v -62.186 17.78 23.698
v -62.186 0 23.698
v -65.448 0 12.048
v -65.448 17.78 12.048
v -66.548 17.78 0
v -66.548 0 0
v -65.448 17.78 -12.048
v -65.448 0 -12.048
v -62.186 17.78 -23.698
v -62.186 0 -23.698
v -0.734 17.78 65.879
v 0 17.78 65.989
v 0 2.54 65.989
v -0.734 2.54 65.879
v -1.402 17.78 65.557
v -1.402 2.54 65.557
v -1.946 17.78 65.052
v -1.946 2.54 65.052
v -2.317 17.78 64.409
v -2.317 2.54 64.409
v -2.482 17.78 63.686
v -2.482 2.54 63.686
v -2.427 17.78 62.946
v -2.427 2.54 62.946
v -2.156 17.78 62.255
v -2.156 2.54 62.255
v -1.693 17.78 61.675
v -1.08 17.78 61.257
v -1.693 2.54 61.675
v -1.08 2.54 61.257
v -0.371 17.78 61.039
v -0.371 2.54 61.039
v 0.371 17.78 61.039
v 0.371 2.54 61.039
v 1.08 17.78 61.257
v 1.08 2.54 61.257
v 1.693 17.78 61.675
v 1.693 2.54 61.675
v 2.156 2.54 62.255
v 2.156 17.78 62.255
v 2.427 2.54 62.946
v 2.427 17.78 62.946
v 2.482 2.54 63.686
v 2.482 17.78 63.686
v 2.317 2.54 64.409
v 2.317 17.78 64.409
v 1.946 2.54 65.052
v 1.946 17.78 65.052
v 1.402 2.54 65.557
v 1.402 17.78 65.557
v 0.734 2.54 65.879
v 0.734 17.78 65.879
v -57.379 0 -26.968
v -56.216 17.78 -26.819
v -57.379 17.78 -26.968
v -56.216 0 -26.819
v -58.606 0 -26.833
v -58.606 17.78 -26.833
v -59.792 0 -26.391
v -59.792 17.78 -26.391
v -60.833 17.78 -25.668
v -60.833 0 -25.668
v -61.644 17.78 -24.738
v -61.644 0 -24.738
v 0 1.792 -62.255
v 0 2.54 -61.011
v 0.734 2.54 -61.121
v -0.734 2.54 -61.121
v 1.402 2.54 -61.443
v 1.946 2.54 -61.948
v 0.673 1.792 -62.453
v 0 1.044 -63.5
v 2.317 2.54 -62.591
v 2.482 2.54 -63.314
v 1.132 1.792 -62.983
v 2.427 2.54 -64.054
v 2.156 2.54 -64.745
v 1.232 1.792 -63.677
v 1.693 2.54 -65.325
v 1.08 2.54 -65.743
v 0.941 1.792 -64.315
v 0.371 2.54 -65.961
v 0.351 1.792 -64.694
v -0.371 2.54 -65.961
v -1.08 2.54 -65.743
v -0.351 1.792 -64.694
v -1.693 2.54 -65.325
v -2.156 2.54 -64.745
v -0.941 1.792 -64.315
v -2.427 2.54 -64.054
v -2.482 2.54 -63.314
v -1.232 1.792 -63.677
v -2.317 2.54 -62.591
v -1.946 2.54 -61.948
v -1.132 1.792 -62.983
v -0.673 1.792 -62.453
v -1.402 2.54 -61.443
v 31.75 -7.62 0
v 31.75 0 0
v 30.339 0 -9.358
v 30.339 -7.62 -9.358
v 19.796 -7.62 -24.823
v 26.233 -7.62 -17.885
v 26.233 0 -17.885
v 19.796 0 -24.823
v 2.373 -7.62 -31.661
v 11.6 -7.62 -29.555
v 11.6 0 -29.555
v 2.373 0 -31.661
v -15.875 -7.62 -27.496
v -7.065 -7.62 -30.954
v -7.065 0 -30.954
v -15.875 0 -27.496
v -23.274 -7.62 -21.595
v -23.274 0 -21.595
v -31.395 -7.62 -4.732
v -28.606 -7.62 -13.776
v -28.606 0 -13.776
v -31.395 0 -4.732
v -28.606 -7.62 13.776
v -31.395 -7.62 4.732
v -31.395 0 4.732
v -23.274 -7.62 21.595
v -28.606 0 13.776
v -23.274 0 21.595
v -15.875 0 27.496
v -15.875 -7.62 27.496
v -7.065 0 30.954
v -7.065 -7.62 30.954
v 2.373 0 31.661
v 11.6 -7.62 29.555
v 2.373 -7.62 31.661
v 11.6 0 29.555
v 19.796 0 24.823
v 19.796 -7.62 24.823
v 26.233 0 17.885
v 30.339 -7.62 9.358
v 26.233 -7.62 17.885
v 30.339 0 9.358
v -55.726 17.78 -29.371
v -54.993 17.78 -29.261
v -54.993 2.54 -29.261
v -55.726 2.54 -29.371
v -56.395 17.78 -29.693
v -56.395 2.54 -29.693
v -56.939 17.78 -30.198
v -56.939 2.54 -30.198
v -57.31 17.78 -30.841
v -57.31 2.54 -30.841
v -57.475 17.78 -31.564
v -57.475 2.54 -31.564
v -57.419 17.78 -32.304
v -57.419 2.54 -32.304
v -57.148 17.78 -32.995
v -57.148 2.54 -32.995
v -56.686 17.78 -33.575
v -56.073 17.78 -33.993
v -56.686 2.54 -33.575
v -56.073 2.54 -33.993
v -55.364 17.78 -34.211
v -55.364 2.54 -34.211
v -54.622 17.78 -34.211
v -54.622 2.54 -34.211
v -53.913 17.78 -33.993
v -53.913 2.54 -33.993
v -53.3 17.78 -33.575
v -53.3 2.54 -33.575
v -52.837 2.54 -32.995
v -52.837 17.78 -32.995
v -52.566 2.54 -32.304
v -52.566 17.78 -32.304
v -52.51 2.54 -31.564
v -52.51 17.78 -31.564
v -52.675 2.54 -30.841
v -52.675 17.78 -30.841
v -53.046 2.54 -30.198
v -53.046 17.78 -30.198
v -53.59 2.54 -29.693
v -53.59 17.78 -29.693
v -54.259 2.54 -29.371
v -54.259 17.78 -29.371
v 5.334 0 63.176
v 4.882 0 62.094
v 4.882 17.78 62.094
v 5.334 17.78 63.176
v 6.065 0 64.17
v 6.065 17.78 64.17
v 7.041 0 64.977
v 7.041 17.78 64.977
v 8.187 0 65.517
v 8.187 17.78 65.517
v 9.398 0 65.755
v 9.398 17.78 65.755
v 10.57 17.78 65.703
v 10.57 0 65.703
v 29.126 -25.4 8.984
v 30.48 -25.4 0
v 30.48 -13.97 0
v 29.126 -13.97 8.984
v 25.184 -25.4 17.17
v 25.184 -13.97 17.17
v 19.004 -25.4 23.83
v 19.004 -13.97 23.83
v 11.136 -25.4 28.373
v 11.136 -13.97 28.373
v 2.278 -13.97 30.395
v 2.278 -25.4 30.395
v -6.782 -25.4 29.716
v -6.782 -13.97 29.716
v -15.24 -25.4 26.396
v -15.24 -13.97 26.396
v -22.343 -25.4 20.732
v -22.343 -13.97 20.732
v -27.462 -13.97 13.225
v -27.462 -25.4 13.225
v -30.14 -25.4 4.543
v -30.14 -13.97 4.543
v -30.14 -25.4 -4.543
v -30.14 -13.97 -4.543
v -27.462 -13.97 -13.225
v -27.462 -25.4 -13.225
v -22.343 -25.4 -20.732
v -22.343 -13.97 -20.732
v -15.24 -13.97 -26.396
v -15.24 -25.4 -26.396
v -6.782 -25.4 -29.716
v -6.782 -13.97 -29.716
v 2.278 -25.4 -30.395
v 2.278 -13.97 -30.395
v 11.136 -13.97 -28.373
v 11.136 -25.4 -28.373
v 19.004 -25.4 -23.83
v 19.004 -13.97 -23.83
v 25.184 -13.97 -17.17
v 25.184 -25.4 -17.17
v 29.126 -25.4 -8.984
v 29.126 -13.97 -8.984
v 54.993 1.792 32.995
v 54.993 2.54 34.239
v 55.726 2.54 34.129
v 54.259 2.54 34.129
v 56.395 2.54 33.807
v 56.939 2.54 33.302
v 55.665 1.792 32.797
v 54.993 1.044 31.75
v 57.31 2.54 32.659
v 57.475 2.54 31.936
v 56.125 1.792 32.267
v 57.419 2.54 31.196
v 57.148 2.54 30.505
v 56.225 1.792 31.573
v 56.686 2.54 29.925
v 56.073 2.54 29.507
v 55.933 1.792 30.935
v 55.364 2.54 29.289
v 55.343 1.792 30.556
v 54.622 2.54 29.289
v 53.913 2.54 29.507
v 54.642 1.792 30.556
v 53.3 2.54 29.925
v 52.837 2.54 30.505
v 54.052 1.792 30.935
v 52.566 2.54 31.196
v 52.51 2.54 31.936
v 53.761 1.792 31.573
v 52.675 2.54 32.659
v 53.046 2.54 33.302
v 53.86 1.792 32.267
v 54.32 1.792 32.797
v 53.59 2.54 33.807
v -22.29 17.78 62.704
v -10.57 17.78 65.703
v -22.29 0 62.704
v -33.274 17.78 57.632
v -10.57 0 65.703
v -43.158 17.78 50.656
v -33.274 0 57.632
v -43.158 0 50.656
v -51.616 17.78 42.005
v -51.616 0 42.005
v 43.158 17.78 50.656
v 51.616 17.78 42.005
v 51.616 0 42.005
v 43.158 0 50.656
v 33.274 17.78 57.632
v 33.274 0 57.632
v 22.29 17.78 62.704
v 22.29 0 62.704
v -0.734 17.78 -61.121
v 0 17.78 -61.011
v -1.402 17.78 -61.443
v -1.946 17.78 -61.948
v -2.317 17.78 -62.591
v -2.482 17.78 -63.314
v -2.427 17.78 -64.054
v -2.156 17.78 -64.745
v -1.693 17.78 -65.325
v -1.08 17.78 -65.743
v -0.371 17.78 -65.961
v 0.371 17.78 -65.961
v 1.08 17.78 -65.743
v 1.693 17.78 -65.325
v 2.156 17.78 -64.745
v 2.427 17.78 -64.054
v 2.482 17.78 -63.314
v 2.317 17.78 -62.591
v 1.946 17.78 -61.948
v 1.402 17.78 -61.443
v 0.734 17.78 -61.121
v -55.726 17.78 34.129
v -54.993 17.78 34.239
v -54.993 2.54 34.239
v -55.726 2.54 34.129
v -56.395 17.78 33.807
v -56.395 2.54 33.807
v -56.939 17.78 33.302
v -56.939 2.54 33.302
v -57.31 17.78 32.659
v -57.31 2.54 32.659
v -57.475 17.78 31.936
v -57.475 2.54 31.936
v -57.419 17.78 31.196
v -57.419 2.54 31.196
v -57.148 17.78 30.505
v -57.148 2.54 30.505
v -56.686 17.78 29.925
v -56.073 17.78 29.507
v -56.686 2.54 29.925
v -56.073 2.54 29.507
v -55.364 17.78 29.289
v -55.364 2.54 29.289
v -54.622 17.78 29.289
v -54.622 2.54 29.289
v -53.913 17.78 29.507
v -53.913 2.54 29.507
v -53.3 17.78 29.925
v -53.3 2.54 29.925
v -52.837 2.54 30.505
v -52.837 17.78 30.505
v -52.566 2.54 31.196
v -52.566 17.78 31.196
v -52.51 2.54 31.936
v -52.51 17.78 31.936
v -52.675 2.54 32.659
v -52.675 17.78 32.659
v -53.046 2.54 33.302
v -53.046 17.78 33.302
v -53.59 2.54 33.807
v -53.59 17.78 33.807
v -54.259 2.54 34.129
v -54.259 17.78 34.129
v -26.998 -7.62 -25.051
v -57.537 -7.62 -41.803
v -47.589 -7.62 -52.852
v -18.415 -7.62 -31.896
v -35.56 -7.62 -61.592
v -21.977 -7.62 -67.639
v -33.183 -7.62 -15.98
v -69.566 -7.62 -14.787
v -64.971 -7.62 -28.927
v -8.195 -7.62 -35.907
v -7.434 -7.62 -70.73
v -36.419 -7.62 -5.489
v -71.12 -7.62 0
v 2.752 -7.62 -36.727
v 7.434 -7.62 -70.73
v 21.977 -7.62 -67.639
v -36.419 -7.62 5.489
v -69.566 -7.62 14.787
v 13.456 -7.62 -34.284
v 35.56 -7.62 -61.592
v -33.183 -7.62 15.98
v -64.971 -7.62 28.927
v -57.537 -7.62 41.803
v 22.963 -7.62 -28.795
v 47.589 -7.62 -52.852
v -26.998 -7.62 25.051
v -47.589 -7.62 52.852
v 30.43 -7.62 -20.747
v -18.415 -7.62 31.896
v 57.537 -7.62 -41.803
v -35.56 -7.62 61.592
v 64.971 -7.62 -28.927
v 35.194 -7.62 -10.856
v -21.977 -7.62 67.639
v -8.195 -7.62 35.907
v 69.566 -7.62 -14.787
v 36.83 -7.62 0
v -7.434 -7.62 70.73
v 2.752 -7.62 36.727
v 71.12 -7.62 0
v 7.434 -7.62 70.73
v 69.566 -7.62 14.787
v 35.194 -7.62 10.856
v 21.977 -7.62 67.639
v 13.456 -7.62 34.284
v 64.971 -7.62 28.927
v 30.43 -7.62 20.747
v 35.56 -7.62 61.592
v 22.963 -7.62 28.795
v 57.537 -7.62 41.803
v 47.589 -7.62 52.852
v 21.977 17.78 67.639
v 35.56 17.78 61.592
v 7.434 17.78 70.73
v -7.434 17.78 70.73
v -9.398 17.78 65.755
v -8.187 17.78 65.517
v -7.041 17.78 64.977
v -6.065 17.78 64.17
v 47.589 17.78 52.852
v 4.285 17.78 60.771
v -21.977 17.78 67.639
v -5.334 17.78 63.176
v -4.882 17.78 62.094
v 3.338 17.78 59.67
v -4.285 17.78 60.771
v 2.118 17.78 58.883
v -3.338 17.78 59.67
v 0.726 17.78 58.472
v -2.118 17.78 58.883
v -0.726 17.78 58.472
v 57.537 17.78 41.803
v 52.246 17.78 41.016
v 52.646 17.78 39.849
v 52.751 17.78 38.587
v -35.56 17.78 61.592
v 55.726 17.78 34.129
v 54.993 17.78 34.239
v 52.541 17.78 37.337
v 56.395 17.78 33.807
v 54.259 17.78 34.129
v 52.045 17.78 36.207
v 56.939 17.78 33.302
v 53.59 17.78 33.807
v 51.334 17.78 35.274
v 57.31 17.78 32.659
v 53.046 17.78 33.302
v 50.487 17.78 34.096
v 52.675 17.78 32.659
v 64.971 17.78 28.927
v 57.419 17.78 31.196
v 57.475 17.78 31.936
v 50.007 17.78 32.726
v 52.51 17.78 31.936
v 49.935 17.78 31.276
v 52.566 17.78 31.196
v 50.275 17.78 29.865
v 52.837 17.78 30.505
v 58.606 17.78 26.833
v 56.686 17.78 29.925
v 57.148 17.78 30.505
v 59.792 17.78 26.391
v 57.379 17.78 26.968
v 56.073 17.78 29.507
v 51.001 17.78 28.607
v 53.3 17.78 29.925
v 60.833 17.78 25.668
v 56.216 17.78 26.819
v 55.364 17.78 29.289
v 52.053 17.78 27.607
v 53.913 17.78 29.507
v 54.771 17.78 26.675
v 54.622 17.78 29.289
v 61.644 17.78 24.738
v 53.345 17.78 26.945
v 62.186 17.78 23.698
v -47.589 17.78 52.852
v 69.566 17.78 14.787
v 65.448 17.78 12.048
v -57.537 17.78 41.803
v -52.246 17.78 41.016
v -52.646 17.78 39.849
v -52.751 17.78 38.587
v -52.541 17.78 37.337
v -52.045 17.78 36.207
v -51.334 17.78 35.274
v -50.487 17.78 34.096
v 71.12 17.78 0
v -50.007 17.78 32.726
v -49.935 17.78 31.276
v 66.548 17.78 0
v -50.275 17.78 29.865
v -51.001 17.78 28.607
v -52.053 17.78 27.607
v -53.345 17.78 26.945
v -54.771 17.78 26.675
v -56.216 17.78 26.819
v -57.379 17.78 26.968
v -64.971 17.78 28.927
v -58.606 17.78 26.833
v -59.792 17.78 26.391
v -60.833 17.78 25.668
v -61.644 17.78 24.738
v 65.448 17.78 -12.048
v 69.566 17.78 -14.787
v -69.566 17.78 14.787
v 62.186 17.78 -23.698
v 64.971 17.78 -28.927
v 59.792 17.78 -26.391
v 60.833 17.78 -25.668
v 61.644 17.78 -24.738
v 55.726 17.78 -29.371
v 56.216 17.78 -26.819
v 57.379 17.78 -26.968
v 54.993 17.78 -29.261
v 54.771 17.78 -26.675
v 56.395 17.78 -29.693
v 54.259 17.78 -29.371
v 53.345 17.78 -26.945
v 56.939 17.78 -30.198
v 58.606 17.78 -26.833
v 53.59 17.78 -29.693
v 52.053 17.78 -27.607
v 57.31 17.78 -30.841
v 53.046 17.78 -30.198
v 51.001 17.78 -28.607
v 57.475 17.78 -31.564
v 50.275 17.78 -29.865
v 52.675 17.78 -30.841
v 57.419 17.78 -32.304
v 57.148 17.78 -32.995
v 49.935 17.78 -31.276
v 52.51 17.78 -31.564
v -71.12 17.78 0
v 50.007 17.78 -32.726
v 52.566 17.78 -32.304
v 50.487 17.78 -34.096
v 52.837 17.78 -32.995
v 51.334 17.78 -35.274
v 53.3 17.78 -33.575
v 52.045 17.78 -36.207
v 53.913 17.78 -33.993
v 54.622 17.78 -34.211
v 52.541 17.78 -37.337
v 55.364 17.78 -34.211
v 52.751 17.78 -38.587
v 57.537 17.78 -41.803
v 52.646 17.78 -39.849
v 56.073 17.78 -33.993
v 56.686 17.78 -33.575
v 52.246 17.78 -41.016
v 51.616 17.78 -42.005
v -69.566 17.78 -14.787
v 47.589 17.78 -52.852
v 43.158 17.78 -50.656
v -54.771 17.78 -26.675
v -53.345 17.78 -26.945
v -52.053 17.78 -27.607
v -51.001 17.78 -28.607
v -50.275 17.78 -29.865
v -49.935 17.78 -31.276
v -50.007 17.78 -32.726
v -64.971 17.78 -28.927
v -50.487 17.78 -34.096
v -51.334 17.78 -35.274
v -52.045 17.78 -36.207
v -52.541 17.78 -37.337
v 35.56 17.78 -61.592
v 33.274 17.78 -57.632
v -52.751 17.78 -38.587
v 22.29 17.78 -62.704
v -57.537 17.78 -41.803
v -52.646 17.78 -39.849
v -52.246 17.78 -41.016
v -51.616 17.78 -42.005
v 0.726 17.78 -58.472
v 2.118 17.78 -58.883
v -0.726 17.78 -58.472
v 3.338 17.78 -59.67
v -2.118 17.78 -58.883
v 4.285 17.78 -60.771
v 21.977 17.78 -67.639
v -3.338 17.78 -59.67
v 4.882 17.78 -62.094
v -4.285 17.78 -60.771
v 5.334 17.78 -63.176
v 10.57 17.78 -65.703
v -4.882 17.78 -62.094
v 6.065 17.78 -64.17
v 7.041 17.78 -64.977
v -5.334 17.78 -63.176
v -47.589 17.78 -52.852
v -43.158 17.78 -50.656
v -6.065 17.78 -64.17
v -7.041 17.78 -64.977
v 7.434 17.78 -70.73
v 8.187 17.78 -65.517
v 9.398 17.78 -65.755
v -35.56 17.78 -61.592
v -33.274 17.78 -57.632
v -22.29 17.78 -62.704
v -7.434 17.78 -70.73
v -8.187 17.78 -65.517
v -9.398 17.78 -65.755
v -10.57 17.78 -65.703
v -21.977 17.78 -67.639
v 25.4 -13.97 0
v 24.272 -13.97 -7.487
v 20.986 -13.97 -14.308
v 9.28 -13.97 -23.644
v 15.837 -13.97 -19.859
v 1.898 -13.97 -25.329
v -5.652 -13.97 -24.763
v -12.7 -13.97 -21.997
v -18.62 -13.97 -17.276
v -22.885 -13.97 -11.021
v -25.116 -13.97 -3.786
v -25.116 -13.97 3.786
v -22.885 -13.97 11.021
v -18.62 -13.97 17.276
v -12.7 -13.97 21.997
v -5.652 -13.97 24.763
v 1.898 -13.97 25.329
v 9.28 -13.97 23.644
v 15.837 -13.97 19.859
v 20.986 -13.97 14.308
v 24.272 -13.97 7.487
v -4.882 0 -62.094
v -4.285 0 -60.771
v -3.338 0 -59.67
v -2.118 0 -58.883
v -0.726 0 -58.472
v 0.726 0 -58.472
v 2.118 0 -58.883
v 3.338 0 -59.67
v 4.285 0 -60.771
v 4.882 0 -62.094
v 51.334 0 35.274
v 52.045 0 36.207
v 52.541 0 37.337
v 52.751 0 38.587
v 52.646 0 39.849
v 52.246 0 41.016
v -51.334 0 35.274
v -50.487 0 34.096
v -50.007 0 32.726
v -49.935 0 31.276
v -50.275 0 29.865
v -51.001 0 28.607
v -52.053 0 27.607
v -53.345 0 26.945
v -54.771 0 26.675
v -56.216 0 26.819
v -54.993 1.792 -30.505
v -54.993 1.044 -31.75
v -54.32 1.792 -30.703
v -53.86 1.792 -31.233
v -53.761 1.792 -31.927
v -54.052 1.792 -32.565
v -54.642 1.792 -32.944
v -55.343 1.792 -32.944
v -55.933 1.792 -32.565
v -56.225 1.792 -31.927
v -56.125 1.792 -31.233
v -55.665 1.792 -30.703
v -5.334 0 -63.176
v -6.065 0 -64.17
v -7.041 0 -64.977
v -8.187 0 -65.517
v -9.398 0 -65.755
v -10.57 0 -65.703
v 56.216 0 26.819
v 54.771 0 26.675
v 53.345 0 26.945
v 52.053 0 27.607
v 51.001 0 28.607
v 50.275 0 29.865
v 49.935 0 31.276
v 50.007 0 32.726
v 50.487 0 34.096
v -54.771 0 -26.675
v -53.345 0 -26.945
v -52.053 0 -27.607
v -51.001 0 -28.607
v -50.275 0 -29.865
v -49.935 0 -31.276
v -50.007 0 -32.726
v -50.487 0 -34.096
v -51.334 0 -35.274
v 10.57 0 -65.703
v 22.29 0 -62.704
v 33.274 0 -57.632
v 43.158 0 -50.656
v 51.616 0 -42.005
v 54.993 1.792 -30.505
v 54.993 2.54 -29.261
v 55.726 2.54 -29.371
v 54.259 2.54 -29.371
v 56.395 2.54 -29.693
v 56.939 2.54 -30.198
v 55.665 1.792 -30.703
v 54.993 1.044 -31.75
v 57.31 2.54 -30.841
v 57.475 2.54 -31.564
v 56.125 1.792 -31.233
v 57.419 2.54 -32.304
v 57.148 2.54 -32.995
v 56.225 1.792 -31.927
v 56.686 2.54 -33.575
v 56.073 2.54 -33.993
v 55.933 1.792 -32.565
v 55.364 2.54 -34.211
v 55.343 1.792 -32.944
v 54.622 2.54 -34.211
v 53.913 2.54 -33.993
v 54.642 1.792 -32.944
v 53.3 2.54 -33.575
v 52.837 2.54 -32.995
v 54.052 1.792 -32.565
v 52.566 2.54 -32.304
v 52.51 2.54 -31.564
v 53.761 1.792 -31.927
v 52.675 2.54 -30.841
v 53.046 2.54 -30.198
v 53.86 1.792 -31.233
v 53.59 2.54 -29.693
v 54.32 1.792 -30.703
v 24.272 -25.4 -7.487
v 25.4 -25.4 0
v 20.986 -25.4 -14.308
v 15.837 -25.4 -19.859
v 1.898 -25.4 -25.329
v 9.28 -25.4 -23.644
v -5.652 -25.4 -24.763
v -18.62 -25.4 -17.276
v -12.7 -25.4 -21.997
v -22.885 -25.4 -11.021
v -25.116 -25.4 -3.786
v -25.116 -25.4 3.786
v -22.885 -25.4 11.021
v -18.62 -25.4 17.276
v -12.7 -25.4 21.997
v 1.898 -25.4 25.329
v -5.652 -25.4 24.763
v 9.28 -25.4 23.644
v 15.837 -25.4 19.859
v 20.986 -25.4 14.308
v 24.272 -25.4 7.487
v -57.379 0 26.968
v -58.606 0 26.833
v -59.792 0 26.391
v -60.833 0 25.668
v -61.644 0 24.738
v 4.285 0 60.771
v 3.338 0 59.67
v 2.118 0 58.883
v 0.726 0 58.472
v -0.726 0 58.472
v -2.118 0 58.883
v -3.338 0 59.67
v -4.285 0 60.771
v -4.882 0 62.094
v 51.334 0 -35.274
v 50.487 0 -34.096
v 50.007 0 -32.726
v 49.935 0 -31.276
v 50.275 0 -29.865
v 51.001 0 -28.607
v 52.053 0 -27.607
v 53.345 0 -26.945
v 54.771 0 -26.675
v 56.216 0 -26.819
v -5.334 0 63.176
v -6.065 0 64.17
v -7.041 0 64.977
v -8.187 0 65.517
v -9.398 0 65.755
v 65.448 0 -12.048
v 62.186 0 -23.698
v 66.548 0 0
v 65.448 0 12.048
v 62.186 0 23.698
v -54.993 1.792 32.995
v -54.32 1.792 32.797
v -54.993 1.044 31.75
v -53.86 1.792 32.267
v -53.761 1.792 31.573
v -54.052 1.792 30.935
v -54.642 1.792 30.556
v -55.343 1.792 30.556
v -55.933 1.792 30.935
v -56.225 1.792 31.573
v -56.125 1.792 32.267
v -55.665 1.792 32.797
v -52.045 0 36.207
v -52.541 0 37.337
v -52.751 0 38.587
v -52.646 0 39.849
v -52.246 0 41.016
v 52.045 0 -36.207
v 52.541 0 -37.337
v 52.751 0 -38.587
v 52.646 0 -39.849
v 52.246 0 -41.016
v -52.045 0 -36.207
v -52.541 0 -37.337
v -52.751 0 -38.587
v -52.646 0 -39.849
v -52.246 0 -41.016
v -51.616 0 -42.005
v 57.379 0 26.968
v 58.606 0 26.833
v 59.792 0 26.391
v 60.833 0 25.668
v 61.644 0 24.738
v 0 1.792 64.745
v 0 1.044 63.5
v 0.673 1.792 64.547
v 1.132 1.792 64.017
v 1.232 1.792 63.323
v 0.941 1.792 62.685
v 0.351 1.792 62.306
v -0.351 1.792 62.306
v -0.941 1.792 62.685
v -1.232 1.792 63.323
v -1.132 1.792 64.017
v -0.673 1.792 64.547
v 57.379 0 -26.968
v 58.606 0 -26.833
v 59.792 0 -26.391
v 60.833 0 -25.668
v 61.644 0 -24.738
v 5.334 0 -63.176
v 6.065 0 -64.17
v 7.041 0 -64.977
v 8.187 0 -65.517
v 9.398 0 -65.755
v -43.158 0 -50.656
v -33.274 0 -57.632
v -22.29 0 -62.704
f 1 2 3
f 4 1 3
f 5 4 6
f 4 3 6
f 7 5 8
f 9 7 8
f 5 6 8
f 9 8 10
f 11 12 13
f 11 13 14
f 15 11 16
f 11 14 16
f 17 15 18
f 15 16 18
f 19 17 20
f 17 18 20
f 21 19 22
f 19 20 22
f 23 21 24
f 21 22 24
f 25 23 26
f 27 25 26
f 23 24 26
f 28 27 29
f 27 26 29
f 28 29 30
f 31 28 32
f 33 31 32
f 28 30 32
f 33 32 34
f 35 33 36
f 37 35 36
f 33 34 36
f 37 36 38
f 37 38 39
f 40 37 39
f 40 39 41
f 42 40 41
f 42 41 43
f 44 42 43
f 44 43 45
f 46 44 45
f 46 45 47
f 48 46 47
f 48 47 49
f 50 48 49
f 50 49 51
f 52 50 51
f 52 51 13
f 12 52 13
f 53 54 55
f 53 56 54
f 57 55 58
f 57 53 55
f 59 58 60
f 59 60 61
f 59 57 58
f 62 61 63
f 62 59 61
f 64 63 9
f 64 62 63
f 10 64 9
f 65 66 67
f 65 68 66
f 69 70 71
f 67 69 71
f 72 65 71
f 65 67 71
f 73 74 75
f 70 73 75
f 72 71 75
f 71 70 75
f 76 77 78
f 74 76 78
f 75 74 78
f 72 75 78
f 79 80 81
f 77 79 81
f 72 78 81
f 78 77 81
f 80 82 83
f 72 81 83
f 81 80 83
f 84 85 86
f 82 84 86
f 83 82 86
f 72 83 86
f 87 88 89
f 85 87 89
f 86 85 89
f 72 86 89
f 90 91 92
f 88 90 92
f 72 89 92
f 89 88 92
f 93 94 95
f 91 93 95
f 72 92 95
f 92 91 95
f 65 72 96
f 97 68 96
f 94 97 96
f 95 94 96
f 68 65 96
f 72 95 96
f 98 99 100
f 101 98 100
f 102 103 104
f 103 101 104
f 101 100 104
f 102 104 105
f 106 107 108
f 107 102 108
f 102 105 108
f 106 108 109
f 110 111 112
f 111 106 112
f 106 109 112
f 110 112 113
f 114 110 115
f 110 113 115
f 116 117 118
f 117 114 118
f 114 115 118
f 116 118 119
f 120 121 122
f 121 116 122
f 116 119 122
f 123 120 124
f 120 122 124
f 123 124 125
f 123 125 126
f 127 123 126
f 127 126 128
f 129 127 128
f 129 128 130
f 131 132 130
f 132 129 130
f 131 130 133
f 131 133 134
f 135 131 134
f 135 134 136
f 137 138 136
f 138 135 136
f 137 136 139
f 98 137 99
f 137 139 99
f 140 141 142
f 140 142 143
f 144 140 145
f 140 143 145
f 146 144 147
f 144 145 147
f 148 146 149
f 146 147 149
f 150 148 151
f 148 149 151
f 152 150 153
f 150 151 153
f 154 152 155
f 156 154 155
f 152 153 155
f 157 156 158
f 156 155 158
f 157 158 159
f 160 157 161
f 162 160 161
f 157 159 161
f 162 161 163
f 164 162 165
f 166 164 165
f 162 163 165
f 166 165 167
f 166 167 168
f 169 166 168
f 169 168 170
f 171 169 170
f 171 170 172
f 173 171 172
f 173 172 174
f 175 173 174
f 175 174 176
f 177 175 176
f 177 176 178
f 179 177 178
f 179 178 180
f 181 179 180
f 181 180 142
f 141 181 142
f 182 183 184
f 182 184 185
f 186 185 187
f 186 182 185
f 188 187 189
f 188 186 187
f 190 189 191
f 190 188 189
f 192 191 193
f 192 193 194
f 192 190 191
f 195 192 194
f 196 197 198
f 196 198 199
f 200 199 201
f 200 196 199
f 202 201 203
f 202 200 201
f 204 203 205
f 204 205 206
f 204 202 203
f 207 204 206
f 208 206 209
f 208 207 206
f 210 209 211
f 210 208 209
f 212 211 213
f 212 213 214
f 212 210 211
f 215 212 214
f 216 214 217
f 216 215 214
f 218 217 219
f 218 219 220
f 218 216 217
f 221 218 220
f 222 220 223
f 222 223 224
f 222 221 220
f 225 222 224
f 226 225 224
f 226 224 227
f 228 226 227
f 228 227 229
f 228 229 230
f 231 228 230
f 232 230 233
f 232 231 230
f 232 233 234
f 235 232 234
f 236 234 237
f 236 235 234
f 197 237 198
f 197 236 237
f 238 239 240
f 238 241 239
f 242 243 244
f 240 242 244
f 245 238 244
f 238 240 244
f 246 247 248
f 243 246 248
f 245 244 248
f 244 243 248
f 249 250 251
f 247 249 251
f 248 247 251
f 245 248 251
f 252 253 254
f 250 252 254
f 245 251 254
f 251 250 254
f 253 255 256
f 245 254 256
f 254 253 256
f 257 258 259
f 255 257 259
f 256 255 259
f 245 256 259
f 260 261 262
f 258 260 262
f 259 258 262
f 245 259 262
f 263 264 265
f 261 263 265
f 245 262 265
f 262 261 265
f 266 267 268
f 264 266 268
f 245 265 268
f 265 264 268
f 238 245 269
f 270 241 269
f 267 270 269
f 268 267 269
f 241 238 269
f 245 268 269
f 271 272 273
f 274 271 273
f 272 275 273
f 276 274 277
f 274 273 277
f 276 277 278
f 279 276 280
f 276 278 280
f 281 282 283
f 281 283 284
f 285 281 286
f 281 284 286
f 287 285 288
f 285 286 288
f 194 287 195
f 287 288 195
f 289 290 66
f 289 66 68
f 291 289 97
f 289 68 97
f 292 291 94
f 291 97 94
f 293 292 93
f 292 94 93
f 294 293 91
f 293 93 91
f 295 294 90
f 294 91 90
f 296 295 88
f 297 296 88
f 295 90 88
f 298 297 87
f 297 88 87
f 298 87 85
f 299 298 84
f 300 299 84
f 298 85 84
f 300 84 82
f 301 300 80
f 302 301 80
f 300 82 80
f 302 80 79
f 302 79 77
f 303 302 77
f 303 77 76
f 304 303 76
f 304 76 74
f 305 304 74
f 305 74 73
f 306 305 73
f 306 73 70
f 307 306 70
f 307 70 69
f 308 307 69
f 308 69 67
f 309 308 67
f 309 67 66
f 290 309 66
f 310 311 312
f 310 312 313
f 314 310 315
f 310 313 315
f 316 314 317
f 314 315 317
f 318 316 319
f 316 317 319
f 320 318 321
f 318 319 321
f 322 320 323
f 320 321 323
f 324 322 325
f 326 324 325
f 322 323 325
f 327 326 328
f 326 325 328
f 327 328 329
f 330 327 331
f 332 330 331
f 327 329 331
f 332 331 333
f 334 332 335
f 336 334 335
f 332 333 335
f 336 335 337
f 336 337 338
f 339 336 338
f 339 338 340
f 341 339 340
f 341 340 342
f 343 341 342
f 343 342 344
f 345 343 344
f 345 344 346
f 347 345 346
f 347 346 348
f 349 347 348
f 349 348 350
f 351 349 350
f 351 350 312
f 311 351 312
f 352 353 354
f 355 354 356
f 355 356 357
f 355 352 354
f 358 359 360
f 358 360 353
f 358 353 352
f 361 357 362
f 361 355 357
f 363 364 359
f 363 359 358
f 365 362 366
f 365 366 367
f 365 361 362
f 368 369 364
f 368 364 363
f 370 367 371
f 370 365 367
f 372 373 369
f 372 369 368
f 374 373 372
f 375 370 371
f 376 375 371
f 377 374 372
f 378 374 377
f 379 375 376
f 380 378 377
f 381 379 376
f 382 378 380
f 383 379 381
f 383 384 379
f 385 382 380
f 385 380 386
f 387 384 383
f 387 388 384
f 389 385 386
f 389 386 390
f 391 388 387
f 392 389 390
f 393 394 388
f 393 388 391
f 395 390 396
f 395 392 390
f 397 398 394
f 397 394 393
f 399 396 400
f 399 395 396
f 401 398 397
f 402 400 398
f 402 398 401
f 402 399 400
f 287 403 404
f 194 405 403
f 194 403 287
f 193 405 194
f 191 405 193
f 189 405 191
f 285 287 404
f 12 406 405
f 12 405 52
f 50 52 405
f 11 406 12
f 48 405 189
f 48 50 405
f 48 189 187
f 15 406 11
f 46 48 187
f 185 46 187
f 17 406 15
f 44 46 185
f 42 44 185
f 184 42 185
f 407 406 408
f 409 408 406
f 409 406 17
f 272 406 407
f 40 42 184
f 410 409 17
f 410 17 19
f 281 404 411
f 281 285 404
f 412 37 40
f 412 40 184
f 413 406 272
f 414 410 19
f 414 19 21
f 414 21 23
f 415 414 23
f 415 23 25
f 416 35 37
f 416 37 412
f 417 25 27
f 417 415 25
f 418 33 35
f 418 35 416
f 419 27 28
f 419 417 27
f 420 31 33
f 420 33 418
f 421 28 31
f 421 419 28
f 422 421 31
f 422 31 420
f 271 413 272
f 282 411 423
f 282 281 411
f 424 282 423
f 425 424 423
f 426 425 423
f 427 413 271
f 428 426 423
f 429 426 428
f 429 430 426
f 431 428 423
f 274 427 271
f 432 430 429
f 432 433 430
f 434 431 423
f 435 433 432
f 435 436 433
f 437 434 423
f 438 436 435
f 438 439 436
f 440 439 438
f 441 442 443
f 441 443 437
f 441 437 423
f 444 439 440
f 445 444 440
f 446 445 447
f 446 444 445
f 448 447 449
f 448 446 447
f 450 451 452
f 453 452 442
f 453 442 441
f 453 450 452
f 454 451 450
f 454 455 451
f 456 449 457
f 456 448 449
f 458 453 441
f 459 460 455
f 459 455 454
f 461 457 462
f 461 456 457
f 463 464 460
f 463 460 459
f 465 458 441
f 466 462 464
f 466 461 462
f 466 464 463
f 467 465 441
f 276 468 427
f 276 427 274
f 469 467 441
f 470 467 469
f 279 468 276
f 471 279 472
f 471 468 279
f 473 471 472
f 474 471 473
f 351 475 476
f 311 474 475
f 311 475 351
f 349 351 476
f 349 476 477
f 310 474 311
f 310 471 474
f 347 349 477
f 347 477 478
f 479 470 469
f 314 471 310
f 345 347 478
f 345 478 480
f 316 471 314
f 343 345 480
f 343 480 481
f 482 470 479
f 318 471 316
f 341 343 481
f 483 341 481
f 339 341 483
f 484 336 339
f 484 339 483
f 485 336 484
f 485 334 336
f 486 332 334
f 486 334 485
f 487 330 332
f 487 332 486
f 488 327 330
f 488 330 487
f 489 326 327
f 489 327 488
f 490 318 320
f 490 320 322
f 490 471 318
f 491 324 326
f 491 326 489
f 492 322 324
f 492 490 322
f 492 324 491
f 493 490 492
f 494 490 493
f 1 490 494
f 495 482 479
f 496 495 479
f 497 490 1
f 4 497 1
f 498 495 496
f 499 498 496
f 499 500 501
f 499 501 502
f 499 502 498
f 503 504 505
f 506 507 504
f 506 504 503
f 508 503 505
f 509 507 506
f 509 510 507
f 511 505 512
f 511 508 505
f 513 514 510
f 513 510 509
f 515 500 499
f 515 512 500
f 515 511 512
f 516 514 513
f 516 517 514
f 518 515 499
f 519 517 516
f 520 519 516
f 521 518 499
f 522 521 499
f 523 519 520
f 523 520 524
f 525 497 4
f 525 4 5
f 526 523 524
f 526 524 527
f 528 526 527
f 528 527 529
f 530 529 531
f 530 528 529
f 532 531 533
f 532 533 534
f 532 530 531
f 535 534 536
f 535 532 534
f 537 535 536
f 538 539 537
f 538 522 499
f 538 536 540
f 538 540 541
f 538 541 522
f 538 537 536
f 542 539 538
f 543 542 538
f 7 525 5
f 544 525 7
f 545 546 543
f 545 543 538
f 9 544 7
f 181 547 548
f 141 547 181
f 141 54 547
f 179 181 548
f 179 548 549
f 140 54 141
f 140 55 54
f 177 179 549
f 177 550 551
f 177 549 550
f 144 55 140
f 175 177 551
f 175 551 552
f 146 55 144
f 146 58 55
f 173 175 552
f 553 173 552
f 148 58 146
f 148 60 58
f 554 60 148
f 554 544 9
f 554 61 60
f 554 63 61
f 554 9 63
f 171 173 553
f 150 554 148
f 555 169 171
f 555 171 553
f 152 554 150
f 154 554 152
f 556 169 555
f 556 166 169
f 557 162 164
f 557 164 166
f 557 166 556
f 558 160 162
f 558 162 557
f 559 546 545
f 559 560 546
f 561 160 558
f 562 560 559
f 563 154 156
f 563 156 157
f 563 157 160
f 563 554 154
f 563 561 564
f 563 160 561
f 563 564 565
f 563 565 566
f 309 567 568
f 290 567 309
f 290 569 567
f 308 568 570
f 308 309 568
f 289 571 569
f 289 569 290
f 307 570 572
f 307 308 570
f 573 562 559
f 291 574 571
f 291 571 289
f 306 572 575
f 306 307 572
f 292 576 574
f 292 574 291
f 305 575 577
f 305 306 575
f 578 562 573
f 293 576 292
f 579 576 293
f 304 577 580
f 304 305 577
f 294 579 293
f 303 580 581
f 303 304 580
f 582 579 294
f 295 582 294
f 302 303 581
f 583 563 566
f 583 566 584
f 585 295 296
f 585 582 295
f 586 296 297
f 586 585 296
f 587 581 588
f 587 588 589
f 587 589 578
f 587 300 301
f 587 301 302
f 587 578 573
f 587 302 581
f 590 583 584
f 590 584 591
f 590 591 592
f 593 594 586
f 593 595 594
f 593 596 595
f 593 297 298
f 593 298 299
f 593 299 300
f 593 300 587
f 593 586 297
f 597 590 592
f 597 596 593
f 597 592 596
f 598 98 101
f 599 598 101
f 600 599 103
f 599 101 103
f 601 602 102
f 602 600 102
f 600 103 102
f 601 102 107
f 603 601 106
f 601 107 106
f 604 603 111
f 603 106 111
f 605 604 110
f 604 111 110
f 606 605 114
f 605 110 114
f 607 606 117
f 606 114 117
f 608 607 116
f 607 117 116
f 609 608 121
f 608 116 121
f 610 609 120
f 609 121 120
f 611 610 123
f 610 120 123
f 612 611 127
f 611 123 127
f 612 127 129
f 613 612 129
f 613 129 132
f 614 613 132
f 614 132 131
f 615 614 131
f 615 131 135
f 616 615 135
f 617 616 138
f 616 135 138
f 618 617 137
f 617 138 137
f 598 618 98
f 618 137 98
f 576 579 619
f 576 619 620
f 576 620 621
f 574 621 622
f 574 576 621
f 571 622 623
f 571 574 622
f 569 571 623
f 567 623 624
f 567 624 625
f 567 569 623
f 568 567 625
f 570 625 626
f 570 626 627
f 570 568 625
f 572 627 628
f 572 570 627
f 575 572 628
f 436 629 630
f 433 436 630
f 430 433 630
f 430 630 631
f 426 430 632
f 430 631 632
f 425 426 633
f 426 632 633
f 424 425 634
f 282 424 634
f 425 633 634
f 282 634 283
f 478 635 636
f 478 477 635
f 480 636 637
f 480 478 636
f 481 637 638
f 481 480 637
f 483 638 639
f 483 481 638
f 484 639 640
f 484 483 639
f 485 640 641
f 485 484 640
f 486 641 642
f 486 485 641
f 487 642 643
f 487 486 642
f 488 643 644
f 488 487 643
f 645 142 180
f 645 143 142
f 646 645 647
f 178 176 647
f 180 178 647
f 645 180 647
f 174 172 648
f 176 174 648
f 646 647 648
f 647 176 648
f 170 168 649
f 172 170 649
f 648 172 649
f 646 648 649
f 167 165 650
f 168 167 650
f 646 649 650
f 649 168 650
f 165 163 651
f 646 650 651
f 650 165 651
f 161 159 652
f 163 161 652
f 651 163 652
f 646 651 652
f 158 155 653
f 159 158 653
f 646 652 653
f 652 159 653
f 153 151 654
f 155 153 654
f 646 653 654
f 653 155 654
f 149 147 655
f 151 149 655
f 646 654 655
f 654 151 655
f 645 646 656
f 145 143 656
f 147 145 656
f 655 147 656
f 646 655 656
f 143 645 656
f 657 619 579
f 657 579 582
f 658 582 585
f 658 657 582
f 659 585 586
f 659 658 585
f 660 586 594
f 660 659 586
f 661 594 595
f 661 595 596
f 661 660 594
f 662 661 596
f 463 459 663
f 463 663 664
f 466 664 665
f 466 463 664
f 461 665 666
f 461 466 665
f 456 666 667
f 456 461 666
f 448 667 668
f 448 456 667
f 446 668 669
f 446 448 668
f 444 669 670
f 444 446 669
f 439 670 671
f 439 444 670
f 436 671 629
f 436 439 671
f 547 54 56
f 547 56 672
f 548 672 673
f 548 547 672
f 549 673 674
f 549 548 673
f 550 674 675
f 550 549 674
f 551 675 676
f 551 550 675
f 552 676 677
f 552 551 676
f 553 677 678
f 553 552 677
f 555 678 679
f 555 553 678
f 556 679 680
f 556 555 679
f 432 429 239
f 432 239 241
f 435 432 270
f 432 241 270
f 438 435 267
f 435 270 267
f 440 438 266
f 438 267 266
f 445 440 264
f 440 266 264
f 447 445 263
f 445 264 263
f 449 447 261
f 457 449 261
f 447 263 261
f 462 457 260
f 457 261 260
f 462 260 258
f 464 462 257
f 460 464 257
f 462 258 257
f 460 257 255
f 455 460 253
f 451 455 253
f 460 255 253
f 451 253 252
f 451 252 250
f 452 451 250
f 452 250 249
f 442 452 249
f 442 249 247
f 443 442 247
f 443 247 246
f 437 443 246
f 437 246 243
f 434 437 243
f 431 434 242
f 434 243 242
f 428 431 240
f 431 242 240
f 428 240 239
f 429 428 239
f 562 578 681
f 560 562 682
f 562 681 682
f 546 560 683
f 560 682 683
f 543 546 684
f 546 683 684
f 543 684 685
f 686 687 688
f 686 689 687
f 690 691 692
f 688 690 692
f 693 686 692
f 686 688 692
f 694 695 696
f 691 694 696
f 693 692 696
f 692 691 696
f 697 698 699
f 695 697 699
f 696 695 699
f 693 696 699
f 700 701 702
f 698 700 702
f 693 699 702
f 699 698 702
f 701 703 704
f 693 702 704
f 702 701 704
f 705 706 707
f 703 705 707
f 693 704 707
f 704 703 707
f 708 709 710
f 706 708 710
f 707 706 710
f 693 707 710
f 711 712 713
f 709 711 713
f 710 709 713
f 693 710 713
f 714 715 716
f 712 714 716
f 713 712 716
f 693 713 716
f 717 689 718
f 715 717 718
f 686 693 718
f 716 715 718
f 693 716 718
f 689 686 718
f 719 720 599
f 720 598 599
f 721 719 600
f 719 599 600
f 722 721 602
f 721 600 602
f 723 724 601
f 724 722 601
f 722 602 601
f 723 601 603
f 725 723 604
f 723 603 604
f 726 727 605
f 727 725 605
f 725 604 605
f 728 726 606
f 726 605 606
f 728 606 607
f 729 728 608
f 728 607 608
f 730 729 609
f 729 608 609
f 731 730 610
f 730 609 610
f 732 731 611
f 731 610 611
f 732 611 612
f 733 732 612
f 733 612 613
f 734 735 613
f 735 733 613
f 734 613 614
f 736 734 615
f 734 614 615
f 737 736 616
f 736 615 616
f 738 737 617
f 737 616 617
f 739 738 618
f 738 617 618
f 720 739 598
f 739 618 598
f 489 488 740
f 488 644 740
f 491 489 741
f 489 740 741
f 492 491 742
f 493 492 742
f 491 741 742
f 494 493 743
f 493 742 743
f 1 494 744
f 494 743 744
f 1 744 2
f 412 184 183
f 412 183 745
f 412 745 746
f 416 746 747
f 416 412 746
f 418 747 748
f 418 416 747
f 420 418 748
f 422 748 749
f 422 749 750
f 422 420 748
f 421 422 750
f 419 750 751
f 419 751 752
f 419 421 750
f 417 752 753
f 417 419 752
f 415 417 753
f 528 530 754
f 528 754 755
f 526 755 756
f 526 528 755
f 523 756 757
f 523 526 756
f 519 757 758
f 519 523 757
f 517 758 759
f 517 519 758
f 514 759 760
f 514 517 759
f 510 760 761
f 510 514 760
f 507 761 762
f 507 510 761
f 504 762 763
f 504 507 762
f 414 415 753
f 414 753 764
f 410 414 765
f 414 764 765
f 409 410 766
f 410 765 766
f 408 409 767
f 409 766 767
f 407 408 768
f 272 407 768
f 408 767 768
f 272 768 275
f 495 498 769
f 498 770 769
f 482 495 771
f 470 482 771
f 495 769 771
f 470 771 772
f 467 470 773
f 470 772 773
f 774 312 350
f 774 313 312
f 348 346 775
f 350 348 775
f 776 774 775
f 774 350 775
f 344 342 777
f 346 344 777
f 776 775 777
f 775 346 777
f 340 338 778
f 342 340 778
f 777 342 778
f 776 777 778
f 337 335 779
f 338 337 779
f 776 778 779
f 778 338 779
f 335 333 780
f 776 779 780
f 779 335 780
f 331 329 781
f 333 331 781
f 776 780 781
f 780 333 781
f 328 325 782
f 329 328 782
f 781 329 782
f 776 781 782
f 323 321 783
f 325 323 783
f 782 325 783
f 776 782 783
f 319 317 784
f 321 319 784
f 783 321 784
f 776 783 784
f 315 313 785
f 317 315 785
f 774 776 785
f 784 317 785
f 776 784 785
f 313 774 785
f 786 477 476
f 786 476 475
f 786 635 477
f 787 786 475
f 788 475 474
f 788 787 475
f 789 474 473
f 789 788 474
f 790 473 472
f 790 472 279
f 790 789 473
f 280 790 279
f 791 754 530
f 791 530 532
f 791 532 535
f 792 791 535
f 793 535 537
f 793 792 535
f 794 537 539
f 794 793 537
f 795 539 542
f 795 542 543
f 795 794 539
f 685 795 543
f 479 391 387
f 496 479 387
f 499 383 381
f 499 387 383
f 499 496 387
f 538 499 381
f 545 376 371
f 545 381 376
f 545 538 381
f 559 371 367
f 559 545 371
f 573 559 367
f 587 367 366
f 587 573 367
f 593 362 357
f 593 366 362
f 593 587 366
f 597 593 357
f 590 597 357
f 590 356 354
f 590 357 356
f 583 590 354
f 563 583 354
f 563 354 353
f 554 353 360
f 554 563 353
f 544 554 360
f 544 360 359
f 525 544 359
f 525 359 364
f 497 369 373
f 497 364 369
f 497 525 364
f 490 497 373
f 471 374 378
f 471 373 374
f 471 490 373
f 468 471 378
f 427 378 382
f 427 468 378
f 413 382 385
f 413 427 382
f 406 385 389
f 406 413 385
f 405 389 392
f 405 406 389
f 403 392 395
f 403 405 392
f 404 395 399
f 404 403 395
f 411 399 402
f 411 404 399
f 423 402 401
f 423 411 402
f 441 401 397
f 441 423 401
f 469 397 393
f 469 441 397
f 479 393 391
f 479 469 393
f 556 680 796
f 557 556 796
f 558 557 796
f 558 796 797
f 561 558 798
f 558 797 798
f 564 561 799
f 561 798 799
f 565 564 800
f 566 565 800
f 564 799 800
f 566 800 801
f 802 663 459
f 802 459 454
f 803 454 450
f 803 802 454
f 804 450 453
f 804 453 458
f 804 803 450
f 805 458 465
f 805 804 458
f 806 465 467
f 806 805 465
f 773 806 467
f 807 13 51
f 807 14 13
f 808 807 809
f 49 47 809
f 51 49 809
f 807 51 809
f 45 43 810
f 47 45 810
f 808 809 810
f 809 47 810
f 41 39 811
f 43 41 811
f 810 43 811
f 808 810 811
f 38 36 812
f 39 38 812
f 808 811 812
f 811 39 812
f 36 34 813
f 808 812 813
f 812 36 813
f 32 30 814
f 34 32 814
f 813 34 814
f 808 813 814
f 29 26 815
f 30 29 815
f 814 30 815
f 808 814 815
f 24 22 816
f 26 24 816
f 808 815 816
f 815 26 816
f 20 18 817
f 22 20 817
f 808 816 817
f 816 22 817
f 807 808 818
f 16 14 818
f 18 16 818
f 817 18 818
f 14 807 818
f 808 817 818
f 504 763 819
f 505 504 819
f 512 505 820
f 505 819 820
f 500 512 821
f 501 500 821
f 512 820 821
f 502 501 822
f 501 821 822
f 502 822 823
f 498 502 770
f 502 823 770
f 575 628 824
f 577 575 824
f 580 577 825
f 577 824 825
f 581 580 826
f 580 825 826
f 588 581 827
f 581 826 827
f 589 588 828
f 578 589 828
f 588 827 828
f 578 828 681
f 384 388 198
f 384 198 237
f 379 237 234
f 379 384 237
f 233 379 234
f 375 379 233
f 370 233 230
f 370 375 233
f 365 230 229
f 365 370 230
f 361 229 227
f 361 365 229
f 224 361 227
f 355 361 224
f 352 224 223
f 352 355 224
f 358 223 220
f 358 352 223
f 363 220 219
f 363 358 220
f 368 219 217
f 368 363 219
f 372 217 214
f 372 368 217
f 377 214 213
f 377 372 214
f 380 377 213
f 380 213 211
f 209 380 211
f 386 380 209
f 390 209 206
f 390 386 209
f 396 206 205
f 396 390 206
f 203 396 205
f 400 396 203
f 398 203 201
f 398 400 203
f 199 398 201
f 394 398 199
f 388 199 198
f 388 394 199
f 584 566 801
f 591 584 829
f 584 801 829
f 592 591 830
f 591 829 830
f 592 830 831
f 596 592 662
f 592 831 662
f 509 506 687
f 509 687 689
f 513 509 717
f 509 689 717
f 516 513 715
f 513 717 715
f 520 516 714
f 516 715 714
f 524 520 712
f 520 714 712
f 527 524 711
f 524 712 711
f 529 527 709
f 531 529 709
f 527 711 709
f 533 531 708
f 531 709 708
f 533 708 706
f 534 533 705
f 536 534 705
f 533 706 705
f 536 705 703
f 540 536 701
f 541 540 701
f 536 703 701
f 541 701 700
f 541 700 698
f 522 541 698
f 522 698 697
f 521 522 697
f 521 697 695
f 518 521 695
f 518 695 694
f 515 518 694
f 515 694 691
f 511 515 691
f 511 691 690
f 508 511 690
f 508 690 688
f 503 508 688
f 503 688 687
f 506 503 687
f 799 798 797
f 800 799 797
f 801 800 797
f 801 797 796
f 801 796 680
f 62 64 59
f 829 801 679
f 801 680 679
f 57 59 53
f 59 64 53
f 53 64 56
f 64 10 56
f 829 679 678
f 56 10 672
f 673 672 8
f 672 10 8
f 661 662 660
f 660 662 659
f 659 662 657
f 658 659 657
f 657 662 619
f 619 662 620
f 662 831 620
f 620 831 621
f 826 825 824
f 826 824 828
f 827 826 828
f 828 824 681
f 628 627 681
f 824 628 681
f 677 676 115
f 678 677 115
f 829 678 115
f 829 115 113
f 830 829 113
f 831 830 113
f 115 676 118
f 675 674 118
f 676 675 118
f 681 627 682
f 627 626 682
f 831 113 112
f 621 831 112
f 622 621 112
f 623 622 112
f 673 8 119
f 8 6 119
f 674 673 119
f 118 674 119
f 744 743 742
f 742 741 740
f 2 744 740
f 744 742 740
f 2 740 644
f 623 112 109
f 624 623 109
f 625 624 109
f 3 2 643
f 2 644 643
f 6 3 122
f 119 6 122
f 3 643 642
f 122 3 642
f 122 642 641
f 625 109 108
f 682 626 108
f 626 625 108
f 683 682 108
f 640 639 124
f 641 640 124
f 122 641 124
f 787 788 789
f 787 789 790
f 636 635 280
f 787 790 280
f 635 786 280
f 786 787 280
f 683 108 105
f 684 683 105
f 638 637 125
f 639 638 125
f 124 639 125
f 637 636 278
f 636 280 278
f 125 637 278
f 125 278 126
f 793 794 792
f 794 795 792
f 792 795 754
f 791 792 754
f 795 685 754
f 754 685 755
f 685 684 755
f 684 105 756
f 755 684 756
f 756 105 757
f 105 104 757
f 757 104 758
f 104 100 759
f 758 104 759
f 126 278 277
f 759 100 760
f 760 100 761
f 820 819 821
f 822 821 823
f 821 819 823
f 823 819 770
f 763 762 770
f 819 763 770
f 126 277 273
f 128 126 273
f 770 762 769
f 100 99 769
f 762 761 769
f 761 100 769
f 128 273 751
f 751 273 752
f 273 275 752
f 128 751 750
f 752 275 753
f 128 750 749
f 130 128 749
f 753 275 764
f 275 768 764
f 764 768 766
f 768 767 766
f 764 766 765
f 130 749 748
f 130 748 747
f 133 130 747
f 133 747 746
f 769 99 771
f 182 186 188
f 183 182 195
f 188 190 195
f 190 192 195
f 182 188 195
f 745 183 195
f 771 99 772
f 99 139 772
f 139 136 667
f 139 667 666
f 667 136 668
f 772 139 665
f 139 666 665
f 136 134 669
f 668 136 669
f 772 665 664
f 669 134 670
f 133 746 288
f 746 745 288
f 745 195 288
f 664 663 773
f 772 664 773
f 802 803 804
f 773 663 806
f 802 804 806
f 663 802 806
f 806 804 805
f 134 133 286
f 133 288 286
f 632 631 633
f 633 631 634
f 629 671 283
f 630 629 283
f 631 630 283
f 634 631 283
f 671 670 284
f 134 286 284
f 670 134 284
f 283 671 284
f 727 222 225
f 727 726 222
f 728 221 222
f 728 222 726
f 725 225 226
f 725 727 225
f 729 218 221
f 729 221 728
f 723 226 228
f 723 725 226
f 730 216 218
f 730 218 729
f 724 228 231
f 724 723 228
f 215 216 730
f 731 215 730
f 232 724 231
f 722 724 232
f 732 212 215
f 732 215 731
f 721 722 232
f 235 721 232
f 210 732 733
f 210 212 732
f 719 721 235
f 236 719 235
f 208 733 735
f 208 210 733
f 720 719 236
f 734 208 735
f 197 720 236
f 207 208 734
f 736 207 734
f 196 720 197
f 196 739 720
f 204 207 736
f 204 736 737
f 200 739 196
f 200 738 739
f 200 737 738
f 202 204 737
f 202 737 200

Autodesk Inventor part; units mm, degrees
ref_plane "YZ Plane" through (0, 0, 0) normal (1, 0, 0) x (0, 1, 0)
ref_plane "XZ Plane" through (0, 0, 0) normal (0, 1, 0) x (-1, 0, 0)
ref_plane "XY Plane" through (0, 0, 0) normal (0, 0, 1) x (1, 0, 0)
sketch "Sketch1" plane through (0, 0, 0) normal (0, 0, 1) x (1, 0, 0)
  line L0 (71.12, 17.78) -> (66.548, 17.78)
  line L1 (66.548, 17.78) -> (66.548, -7.62)
  line L2 (66.548, -7.62) -> (71.12, -7.62)
  line L3 (71.12, -7.62) -> (71.12, 17.78)
  line L4 (66.548, -7.62) -> (31.75, -7.62)
  line L5 (31.75, -7.62) -> (31.75, 0)
  line L6 (31.75, 0) -> (66.548, 0)
  line L7 (66.548, 0) -> (66.548, -7.62)
  line L8 (25.4, -13.97) -> (30.48, -13.97)
  line L9 (30.48, -13.97) -> (30.48, -25.4)
  line L10 (30.48, -25.4) -> (25.4, -25.4)
  line L11 (25.4, -25.4) -> (25.4, -13.97)
  line L12 (0, 0) -> (0, -50.8709) construction
  line L13 (25.4, -13.97) -> (31.75, -7.62)
  line L14 (30.48, -13.97) -> (36.83, -7.62)
  dimension "d0" = 142.24
  dimension "d1" = 50.8
  dimension "d2" = 4.572
  dimension "d4" = 6.35
  dimension "d5" = 11.43
  dimension "d6" = 25.4
  dimension "d7" = 45
  dimension "d9" = 5.08
  dimension "d10" = 7.62
revolve "Revolution1" add sketch "Sketch1" angle 360 about axis through (0, 0, 0) along (0, -1, 0)
sketch "Sketch2" plane through (0, 17.78, 0) normal (0, 1, 0) x (1, 0, 0)
  circle A0 centre (0, 0) radius 71.12 projected
  line L0 (0, 0) -> (0, 63.5) construction
  circle A1 centre (0, 63.5) radius 5.08
  dimension "d11" = 63.5
  dimension "d12" = 10.16
extrude "Extrusion1" add sketch "Sketch2" against normal up to surface (17.78 mm away) contours A1
fillet "Fillet1" radius 5.08 2 edges at (4.1584, 8.89, -66.418) (-4.1584, 8.89, -66.418)
pattern_circular "Circular Pattern1" count 6 over 360 about axis through (0, -19.685, 0) along (0, -1, 0) of "Extrusion1", "Fillet1"
thread "Thread1" size "2" designation "2 - 11.5 NPT" standard "NPT" length 26.8732
sketch "Sketch3" plane through (0, 17.78, 0) normal (0, 1, 0) x (1, 0, 0)
  arc A0 (-4.8815, 62.0939) -> (4.8815, 62.0939) centre (0, 63.5) ccw projected
  arc A1 (-51.3341, -35.2744) -> (-56.2156, -26.8194) centre (-54.9926, -31.75) ccw projected
  arc A2 (4.8815, -62.0939) -> (-4.8815, -62.0939) centre (0, -63.5) ccw projected
  arc A3 (56.2156, -26.8194) -> (51.3341, -35.2744) centre (54.9926, -31.75) ccw projected
  arc A4 (51.3341, 35.2744) -> (56.2156, 26.8194) centre (54.9926, 31.75) ccw projected
  arc A5 (-56.2156, 26.8194) -> (-51.3341, 35.2744) centre (-54.9926, 31.75) ccw projected
  point P0 (0, 63.5)
  point P1 (-51.8006, -35.7019)
  point P2 (-56.819, -27.0097)
  point P3 (5.0184, -62.7116)
  point P4 (-5.0184, -62.7116)
  point P5 (56.819, -27.0097)
  point P6 (51.8006, -35.7019)
  point P7 (51.8006, 35.7019)
  point P8 (56.819, 27.0097)
  point P9 (-56.819, 27.0097)
  point P10 (-51.8006, 35.7019)
hole "Hole1" at (0, 17.78, -63.5) at (-54.9926, 17.78, 31.75) at (0, 17.78, 63.5) at (54.9926, 17.78, 31.75) at (54.9926, 17.78, -31.75) at (-54.9926, 17.78, -31.75) direction (0, -1, 0) diameter 4.9784 depth 15.24 tip angle 118 thread size "1/4-20 UNC" class "2B" standard "ANSI Unified Screw Threads"
properties part number "Cap Housing Base"
